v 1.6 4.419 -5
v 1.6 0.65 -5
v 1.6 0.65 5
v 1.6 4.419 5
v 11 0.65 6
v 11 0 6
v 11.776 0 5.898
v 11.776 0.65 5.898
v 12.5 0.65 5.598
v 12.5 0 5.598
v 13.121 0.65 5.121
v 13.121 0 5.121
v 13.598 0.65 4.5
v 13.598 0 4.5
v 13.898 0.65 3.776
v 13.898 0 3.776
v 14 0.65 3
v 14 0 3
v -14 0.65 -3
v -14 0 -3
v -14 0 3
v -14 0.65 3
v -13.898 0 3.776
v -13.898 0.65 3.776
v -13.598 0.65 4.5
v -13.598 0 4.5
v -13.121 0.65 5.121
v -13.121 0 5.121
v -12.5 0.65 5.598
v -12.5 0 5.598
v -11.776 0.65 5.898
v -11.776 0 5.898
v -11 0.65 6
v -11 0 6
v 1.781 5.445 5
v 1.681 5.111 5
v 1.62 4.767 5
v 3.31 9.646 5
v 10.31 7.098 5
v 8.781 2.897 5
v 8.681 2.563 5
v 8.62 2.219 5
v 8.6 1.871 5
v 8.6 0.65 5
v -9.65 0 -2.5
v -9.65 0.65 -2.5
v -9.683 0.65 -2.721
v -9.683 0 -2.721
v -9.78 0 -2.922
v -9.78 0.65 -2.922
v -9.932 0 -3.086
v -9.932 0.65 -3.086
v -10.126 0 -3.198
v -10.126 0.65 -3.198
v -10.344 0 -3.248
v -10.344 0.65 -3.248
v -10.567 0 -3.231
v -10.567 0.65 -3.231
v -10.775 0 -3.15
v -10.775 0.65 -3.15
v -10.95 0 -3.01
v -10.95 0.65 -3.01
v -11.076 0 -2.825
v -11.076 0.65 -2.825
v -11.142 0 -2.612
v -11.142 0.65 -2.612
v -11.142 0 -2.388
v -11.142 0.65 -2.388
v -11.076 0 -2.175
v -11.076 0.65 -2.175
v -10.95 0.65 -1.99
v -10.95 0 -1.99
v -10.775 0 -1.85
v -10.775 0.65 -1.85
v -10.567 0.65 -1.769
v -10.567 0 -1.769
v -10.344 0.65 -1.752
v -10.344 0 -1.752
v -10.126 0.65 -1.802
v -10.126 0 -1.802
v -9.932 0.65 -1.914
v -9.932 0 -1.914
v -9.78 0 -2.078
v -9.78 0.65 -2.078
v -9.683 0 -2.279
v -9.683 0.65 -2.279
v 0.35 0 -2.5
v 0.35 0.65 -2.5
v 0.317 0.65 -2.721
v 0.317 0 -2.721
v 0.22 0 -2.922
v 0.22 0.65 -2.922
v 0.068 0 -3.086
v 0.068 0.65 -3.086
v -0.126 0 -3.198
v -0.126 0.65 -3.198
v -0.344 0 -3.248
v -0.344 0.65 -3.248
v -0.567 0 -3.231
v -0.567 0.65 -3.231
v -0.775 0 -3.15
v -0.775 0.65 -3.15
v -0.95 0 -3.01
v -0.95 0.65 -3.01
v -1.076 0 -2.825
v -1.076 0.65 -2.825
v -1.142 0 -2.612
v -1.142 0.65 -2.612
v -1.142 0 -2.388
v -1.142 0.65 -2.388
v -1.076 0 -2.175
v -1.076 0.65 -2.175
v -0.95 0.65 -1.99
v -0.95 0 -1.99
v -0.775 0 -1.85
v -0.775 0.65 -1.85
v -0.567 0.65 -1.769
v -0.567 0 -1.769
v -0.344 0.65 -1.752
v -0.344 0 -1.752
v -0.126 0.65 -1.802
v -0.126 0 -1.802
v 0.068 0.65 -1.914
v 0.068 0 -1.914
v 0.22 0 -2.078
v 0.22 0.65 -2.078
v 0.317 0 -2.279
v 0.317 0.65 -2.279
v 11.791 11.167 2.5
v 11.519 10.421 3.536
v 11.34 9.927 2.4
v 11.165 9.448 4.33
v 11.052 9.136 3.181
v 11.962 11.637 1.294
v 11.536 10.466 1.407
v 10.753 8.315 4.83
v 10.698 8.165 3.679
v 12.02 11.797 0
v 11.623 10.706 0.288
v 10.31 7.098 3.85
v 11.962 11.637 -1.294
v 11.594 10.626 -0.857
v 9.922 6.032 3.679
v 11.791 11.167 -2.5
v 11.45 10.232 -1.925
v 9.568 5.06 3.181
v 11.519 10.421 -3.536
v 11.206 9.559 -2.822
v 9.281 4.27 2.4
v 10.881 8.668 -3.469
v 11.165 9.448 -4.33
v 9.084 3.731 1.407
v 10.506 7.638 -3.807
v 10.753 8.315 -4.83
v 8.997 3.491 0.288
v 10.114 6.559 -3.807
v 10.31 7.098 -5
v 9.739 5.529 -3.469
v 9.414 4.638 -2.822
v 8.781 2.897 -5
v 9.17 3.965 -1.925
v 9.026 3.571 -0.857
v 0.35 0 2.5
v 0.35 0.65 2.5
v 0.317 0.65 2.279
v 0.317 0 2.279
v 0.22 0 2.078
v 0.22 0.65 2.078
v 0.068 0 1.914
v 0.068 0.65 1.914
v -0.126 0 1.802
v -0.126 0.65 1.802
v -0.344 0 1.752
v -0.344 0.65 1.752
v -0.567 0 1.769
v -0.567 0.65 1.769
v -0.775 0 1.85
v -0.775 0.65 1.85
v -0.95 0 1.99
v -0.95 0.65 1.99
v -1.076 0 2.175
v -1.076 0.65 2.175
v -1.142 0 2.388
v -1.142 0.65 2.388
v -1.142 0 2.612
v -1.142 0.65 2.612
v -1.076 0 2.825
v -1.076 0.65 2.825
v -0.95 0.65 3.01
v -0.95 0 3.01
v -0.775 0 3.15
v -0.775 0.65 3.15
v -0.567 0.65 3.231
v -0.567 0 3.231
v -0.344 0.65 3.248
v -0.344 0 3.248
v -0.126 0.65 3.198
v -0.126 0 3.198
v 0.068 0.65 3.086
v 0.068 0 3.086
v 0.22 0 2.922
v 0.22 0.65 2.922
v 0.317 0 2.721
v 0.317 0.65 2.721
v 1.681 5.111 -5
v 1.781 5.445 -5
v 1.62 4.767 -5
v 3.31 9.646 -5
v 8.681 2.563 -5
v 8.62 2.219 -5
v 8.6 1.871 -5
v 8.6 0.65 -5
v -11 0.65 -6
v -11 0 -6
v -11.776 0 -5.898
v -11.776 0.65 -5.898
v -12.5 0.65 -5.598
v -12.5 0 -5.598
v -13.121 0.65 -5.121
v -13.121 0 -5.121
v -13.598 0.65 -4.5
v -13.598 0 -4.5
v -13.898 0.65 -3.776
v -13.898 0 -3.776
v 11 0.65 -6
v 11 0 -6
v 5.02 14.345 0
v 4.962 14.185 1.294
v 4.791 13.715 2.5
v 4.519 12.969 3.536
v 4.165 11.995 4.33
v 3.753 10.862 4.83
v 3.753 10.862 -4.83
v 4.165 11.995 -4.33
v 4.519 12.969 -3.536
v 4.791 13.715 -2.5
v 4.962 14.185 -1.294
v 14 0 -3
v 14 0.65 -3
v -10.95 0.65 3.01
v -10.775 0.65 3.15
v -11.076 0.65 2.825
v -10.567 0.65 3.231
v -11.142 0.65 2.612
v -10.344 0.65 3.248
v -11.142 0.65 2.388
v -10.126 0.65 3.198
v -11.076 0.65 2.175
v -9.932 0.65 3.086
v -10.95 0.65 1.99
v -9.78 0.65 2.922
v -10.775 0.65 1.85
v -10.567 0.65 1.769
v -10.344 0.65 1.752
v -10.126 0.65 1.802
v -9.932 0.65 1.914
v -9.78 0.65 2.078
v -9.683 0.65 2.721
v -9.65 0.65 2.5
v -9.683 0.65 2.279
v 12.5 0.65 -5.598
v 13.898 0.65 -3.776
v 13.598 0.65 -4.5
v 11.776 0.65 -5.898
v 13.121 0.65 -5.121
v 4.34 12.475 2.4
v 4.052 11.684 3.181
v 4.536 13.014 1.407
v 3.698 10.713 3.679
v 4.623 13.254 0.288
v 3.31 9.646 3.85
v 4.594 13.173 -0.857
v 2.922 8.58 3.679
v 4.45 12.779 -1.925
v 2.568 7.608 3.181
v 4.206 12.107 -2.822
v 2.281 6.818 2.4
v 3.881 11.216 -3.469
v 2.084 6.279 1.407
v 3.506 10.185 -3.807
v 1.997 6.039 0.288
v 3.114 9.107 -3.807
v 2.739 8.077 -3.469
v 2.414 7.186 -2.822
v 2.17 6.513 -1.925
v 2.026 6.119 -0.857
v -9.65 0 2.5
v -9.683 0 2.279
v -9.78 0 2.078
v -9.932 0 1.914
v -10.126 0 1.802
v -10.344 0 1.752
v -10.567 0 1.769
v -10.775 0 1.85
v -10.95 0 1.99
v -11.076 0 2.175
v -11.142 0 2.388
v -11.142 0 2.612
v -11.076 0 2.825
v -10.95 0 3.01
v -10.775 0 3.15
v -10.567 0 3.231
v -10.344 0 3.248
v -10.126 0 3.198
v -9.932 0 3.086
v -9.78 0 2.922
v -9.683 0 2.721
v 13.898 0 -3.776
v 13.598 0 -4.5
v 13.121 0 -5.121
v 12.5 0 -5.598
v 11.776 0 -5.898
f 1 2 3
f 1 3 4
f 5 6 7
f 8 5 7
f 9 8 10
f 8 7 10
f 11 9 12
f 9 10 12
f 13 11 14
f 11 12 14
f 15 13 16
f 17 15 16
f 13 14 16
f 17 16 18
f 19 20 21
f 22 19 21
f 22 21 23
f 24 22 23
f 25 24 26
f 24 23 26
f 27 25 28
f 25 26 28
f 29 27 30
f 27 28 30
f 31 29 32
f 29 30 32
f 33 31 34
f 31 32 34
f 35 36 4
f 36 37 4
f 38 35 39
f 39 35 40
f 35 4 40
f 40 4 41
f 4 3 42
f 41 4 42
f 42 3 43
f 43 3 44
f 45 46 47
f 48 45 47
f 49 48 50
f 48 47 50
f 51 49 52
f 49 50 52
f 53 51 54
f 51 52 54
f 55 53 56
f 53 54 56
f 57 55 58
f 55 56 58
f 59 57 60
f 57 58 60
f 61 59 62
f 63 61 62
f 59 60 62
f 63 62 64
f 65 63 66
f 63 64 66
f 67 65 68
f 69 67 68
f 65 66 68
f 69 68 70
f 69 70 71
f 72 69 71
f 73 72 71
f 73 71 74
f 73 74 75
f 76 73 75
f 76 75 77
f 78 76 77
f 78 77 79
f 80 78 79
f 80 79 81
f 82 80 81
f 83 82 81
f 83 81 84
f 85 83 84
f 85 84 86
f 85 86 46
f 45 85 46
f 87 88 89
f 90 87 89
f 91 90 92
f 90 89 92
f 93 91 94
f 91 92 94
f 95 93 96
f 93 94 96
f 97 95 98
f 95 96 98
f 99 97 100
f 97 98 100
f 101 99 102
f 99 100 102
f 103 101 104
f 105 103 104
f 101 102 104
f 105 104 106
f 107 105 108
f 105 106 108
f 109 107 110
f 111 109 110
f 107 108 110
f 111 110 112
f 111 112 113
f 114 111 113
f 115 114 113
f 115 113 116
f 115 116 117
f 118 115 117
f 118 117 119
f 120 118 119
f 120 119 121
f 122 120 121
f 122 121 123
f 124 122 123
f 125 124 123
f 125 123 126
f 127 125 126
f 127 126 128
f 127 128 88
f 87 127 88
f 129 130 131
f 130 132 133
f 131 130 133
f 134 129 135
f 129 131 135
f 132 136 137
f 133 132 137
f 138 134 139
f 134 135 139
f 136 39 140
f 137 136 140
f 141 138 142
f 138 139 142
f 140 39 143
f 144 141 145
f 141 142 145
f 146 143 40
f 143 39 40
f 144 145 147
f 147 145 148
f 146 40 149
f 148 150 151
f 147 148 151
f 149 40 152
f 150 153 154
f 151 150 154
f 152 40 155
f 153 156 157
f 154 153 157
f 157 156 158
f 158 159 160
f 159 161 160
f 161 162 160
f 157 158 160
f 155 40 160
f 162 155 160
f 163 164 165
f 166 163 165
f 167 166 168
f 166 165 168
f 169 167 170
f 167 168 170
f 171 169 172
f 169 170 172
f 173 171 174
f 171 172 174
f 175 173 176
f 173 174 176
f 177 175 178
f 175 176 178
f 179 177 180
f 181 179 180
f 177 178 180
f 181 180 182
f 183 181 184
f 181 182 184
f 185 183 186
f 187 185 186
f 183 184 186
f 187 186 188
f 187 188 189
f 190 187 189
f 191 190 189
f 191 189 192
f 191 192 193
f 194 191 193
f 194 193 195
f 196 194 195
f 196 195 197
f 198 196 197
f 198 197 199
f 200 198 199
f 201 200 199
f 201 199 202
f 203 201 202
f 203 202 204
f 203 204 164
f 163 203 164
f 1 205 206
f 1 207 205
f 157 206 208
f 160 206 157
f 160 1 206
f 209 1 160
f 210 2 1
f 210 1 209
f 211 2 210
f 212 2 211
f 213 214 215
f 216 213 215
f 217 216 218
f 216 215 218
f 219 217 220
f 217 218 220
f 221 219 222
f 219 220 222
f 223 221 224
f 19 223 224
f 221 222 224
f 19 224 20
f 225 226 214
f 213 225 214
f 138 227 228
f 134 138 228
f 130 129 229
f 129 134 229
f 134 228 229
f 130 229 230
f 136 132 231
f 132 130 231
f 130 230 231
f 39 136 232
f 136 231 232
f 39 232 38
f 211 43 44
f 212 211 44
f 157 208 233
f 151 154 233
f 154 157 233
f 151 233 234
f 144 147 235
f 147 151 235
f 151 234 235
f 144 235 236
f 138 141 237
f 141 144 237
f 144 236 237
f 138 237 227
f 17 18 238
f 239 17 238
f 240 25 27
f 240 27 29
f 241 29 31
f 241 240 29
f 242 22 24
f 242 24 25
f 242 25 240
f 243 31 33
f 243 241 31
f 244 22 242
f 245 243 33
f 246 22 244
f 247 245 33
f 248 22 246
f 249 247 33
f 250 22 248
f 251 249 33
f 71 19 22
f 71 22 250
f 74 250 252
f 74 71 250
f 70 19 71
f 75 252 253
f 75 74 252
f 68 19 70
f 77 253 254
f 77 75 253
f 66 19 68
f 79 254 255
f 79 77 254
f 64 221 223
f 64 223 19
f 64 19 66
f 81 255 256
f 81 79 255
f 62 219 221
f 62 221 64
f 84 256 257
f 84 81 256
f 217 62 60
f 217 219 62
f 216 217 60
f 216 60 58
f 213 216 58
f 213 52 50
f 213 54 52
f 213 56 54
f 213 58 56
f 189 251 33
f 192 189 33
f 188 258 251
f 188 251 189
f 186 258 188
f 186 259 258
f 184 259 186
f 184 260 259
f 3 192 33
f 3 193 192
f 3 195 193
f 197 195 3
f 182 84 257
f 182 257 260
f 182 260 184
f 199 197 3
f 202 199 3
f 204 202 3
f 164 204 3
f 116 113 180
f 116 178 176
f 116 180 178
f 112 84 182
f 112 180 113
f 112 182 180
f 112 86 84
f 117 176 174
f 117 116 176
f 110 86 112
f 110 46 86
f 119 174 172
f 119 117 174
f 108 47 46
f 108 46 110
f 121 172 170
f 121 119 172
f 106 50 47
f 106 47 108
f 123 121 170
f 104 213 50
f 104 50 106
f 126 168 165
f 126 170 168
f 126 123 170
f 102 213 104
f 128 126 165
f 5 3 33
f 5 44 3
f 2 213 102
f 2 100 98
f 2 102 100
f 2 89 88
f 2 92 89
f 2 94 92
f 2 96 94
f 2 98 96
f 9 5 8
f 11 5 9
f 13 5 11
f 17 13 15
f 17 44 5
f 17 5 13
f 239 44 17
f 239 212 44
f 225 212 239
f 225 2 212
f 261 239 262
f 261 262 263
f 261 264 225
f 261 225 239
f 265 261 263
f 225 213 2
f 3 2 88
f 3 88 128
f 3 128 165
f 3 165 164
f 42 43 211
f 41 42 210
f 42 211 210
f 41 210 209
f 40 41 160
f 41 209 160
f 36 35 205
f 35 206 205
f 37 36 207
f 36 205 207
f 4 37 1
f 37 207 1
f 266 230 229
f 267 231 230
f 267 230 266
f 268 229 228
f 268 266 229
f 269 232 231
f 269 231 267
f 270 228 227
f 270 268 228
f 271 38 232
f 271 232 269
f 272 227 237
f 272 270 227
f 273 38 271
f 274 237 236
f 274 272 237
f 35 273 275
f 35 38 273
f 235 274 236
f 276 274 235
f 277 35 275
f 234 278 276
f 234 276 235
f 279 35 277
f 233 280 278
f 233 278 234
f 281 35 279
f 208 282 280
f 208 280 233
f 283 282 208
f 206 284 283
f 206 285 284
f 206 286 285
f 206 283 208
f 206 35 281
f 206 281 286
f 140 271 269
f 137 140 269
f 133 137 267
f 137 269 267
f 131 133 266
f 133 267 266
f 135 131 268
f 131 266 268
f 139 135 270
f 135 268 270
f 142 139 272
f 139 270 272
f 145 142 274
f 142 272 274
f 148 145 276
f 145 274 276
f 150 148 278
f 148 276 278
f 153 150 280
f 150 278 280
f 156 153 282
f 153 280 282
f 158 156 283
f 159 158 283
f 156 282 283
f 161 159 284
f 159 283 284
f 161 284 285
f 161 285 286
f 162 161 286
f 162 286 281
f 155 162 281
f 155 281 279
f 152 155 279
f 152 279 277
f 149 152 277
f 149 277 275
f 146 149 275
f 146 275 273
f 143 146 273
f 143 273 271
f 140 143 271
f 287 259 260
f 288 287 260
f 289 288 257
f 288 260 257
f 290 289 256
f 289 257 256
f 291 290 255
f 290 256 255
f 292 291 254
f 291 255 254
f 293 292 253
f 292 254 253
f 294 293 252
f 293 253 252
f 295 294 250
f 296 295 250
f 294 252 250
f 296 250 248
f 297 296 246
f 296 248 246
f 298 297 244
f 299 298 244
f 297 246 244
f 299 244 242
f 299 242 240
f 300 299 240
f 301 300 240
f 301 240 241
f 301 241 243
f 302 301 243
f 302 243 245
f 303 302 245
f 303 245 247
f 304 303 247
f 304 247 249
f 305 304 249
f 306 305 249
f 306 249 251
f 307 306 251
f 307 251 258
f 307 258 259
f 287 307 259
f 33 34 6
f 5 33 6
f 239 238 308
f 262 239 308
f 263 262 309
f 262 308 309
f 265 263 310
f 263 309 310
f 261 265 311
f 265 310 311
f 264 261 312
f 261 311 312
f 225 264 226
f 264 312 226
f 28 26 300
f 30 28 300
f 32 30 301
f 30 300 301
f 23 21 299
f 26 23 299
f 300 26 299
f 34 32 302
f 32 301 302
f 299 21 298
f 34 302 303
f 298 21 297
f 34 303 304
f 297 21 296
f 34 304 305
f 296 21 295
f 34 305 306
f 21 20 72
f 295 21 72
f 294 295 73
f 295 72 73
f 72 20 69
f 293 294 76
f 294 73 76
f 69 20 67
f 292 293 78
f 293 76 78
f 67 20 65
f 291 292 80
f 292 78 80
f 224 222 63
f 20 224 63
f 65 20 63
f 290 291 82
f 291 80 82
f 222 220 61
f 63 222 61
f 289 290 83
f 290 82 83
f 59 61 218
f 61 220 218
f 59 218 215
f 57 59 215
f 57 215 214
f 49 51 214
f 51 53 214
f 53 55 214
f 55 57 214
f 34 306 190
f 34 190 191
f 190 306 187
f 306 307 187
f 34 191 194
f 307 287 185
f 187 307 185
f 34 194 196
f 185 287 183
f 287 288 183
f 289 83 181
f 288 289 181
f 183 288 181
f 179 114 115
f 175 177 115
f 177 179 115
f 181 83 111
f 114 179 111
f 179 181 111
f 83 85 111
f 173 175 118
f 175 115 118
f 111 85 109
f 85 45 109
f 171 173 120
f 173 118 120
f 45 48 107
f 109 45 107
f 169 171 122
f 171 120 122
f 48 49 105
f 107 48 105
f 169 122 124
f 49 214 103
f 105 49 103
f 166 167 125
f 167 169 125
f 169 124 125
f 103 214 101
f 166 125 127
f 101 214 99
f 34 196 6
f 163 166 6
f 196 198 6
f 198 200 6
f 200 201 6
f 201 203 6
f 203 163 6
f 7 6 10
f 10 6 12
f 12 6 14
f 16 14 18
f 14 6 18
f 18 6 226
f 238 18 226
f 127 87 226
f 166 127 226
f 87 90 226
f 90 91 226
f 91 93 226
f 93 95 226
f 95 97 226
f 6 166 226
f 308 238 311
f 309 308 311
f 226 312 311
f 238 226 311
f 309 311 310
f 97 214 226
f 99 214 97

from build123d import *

# Parameters (mm, degrees)
BOSS_EXTRUDE1_DEPTH = 0.65
BOSS_EXTRUDE2_DEPTH = 10
SKETCH9_W           = 7.449244408
SKETCH9_H           = 10
BOSS_EXTRUDE3_DEPTH = 10
CUT_EXTRUDE1_REACH  = 15.344
SKETCH10_R          = 3.85
CUT_EXTRUDE2_REACH  = 2.65
SKETCH6_R           = 0.75
FILLET1_R           = 3


with BuildPart() as part:
    # Sketch1 → Boss-Extrude1 (new body)
    with BuildSketch(Plane(origin=(0, 0, 0), x_dir=(1, 0, 0), z_dir=(0, 1, 0))):
        with BuildLine():
            Line((-11, -6), (11, -6))
            ThreePointArc((11, -6), (13.121320344, -5.121320344), (14, -3))
            Line((14, -3), (14, 3))
            ThreePointArc((14, 3), (13.121320344, 5.121320344), (11, 6))
            Line((11, 6), (-11, 6))
            ThreePointArc((-11, 6), (-13.121320344, 5.121320344), (-14, 3))
            Line((-14, 3), (-14, -3))
            ThreePointArc((-14, -3), (-13.121320344, -5.121320344), (-11, -6))
        make_face()
    extrude(amount=BOSS_EXTRUDE1_DEPTH)

    # Sketch8 → Boss-Extrude2 (add)
    with BuildSketch(Plane.XY.offset(5)):
        Polygon((1.6, 0.65), (1.6, 4.94779164), (8.6, 2.4), (8.6, 0.65), align=None)
    extrude(amount=-BOSS_EXTRUDE2_DEPTH)

    # Sketch9 → Boss-Extrude3 (add)
    with BuildSketch(Plane(origin=(1.777354026, 4.883240053, 0), x_dir=(0.939692621, -0.342020143, 0), z_dir=(0.342020143, 0.939692621, 0))):
        with Locations((3.535885991, 0)):
            Rectangle(SKETCH9_W, SKETCH9_H)
    extrude(amount=BOSS_EXTRUDE3_DEPTH)

    # Sketch10 → Cut-Extrude1 (cut, up to next)
    with BuildSketch(Plane(origin=(-0.177354026, 0.064551586, 0), x_dir=(0, 0, 1), z_dir=(-0.939692621, 0.342020143, 0)), mode=Mode.PRIVATE) as cut_extrude1_sk1:
        with BuildLine():
            Line((5, 15.196635522), (-6.8e-08, 15.196635522))
            ThreePointArc((-6.8e-08, 15.196635522), (3.535533882, 13.732169453), (5, 10.196635522))
            Line((5, 10.196635522), (5, 15.196635522))
        make_face()
    cut_extrude1_tool1 = extrude(cut_extrude1_sk1.sketch, amount=-CUT_EXTRUDE1_REACH, mode=Mode.PRIVATE) & part.part
    add(cut_extrude1_tool1.solids().sort_by_distance((4.63822, 13.295232, 3.88316))[0], mode=Mode.SUBTRACT)
    # Sketch10 → Cut-Extrude1 (cut, up to next)
    with BuildSketch(Plane(origin=(-0.177354026, 0.064551586, 0), x_dir=(0, 0, 1), z_dir=(-0.939692621, 0.342020143, 0)), mode=Mode.PRIVATE) as cut_extrude1_sk2:
        with BuildLine():
            Line((-5, 15.196635522), (-5, 10.196635522))
            ThreePointArc((-5, 10.196635522), (-3.53553393, 13.732169404), (-6.8e-08, 15.196635522))
            Line((-6.8e-08, 15.196635522), (-5, 15.196635522))
        make_face()
    cut_extrude1_tool2 = extrude(cut_extrude1_sk2.sketch, amount=-CUT_EXTRUDE1_REACH, mode=Mode.PRIVATE) & part.part
    add(cut_extrude1_tool2.solids().sort_by_distance((4.63822, 13.295232, -3.88316))[0], mode=Mode.SUBTRACT)
    # Sketch10 → Cut-Extrude1 (cut, up to next)
    with BuildSketch(Plane(origin=(-0.177354026, 0.064551586, 0), x_dir=(0, 0, 1), z_dir=(-0.939692621, 0.342020143, 0)), mode=Mode.PRIVATE) as cut_extrude1_sk3:
        with Locations((0, 10.196635522)):
            Circle(SKETCH10_R)
    cut_extrude1_tool3 = extrude(cut_extrude1_sk3.sketch, amount=-CUT_EXTRUDE1_REACH, mode=Mode.PRIVATE) & part.part
    add(cut_extrude1_tool3.solids().sort_by_distance((3.310101, 9.646255, 0))[0], mode=Mode.SUBTRACT)

    # Sketch6 → Cut-Extrude2 (cut, up to next)
    with BuildSketch(Plane(origin=(0, 0.65, 0), x_dir=(1, 0, 0), z_dir=(0, 1, 0)), mode=Mode.PRIVATE) as cut_extrude2_sk1:
        with Locations((-10.4, 2.5)):
            Circle(SKETCH6_R)
    cut_extrude2_tool1 = extrude(cut_extrude2_sk1.sketch, amount=-CUT_EXTRUDE2_REACH, mode=Mode.PRIVATE) & part.part
    add(cut_extrude2_tool1.solids().sort_by_distance((-10.4, 0.65, -2.5))[0], mode=Mode.SUBTRACT)
    # Sketch6 → Cut-Extrude2 (cut, up to next)
    with BuildSketch(Plane(origin=(0, 0.65, 0), x_dir=(1, 0, 0), z_dir=(0, 1, 0)), mode=Mode.PRIVATE) as cut_extrude2_sk2:
        with Locations((-0.4, 2.5)):
            Circle(SKETCH6_R)
    cut_extrude2_tool2 = extrude(cut_extrude2_sk2.sketch, amount=-CUT_EXTRUDE2_REACH, mode=Mode.PRIVATE) & part.part
    add(cut_extrude2_tool2.solids().sort_by_distance((-0.4, 0.65, -2.5))[0], mode=Mode.SUBTRACT)
    # Sketch6 → Cut-Extrude2 (cut, up to next)
    with BuildSketch(Plane(origin=(0, 0.65, 0), x_dir=(1, 0, 0), z_dir=(0, 1, 0)), mode=Mode.PRIVATE) as cut_extrude2_sk3:
        with Locations((-0.4, -2.5)):
            Circle(SKETCH6_R)
    cut_extrude2_tool3 = extrude(cut_extrude2_sk3.sketch, amount=-CUT_EXTRUDE2_REACH, mode=Mode.PRIVATE) & part.part
    add(cut_extrude2_tool3.solids().sort_by_distance((-0.4, 0.65, 2.5))[0], mode=Mode.SUBTRACT)
    # Sketch6 → Cut-Extrude2 (cut, up to next)
    with BuildSketch(Plane(origin=(0, 0.65, 0), x_dir=(1, 0, 0), z_dir=(0, 1, 0)), mode=Mode.PRIVATE) as cut_extrude2_sk4:
        with Locations((-10.4, -2.5)):
            Circle(SKETCH6_R)
    cut_extrude2_tool4 = extrude(cut_extrude2_sk4.sketch, amount=-CUT_EXTRUDE2_REACH, mode=Mode.PRIVATE) & part.part
    add(cut_extrude2_tool4.solids().sort_by_distance((-10.4, 0.65, 2.5))[0], mode=Mode.SUBTRACT)

    # Fillet1
    fillet1_edges = [part.edges().sort_by_distance(p)[0] for p in [
        (1.6, 4.94779164, 0),
        (8.6, 2.4, 0),
    ]]
    fillet(fillet1_edges, radius=FILLET1_R)


solid = part.part
